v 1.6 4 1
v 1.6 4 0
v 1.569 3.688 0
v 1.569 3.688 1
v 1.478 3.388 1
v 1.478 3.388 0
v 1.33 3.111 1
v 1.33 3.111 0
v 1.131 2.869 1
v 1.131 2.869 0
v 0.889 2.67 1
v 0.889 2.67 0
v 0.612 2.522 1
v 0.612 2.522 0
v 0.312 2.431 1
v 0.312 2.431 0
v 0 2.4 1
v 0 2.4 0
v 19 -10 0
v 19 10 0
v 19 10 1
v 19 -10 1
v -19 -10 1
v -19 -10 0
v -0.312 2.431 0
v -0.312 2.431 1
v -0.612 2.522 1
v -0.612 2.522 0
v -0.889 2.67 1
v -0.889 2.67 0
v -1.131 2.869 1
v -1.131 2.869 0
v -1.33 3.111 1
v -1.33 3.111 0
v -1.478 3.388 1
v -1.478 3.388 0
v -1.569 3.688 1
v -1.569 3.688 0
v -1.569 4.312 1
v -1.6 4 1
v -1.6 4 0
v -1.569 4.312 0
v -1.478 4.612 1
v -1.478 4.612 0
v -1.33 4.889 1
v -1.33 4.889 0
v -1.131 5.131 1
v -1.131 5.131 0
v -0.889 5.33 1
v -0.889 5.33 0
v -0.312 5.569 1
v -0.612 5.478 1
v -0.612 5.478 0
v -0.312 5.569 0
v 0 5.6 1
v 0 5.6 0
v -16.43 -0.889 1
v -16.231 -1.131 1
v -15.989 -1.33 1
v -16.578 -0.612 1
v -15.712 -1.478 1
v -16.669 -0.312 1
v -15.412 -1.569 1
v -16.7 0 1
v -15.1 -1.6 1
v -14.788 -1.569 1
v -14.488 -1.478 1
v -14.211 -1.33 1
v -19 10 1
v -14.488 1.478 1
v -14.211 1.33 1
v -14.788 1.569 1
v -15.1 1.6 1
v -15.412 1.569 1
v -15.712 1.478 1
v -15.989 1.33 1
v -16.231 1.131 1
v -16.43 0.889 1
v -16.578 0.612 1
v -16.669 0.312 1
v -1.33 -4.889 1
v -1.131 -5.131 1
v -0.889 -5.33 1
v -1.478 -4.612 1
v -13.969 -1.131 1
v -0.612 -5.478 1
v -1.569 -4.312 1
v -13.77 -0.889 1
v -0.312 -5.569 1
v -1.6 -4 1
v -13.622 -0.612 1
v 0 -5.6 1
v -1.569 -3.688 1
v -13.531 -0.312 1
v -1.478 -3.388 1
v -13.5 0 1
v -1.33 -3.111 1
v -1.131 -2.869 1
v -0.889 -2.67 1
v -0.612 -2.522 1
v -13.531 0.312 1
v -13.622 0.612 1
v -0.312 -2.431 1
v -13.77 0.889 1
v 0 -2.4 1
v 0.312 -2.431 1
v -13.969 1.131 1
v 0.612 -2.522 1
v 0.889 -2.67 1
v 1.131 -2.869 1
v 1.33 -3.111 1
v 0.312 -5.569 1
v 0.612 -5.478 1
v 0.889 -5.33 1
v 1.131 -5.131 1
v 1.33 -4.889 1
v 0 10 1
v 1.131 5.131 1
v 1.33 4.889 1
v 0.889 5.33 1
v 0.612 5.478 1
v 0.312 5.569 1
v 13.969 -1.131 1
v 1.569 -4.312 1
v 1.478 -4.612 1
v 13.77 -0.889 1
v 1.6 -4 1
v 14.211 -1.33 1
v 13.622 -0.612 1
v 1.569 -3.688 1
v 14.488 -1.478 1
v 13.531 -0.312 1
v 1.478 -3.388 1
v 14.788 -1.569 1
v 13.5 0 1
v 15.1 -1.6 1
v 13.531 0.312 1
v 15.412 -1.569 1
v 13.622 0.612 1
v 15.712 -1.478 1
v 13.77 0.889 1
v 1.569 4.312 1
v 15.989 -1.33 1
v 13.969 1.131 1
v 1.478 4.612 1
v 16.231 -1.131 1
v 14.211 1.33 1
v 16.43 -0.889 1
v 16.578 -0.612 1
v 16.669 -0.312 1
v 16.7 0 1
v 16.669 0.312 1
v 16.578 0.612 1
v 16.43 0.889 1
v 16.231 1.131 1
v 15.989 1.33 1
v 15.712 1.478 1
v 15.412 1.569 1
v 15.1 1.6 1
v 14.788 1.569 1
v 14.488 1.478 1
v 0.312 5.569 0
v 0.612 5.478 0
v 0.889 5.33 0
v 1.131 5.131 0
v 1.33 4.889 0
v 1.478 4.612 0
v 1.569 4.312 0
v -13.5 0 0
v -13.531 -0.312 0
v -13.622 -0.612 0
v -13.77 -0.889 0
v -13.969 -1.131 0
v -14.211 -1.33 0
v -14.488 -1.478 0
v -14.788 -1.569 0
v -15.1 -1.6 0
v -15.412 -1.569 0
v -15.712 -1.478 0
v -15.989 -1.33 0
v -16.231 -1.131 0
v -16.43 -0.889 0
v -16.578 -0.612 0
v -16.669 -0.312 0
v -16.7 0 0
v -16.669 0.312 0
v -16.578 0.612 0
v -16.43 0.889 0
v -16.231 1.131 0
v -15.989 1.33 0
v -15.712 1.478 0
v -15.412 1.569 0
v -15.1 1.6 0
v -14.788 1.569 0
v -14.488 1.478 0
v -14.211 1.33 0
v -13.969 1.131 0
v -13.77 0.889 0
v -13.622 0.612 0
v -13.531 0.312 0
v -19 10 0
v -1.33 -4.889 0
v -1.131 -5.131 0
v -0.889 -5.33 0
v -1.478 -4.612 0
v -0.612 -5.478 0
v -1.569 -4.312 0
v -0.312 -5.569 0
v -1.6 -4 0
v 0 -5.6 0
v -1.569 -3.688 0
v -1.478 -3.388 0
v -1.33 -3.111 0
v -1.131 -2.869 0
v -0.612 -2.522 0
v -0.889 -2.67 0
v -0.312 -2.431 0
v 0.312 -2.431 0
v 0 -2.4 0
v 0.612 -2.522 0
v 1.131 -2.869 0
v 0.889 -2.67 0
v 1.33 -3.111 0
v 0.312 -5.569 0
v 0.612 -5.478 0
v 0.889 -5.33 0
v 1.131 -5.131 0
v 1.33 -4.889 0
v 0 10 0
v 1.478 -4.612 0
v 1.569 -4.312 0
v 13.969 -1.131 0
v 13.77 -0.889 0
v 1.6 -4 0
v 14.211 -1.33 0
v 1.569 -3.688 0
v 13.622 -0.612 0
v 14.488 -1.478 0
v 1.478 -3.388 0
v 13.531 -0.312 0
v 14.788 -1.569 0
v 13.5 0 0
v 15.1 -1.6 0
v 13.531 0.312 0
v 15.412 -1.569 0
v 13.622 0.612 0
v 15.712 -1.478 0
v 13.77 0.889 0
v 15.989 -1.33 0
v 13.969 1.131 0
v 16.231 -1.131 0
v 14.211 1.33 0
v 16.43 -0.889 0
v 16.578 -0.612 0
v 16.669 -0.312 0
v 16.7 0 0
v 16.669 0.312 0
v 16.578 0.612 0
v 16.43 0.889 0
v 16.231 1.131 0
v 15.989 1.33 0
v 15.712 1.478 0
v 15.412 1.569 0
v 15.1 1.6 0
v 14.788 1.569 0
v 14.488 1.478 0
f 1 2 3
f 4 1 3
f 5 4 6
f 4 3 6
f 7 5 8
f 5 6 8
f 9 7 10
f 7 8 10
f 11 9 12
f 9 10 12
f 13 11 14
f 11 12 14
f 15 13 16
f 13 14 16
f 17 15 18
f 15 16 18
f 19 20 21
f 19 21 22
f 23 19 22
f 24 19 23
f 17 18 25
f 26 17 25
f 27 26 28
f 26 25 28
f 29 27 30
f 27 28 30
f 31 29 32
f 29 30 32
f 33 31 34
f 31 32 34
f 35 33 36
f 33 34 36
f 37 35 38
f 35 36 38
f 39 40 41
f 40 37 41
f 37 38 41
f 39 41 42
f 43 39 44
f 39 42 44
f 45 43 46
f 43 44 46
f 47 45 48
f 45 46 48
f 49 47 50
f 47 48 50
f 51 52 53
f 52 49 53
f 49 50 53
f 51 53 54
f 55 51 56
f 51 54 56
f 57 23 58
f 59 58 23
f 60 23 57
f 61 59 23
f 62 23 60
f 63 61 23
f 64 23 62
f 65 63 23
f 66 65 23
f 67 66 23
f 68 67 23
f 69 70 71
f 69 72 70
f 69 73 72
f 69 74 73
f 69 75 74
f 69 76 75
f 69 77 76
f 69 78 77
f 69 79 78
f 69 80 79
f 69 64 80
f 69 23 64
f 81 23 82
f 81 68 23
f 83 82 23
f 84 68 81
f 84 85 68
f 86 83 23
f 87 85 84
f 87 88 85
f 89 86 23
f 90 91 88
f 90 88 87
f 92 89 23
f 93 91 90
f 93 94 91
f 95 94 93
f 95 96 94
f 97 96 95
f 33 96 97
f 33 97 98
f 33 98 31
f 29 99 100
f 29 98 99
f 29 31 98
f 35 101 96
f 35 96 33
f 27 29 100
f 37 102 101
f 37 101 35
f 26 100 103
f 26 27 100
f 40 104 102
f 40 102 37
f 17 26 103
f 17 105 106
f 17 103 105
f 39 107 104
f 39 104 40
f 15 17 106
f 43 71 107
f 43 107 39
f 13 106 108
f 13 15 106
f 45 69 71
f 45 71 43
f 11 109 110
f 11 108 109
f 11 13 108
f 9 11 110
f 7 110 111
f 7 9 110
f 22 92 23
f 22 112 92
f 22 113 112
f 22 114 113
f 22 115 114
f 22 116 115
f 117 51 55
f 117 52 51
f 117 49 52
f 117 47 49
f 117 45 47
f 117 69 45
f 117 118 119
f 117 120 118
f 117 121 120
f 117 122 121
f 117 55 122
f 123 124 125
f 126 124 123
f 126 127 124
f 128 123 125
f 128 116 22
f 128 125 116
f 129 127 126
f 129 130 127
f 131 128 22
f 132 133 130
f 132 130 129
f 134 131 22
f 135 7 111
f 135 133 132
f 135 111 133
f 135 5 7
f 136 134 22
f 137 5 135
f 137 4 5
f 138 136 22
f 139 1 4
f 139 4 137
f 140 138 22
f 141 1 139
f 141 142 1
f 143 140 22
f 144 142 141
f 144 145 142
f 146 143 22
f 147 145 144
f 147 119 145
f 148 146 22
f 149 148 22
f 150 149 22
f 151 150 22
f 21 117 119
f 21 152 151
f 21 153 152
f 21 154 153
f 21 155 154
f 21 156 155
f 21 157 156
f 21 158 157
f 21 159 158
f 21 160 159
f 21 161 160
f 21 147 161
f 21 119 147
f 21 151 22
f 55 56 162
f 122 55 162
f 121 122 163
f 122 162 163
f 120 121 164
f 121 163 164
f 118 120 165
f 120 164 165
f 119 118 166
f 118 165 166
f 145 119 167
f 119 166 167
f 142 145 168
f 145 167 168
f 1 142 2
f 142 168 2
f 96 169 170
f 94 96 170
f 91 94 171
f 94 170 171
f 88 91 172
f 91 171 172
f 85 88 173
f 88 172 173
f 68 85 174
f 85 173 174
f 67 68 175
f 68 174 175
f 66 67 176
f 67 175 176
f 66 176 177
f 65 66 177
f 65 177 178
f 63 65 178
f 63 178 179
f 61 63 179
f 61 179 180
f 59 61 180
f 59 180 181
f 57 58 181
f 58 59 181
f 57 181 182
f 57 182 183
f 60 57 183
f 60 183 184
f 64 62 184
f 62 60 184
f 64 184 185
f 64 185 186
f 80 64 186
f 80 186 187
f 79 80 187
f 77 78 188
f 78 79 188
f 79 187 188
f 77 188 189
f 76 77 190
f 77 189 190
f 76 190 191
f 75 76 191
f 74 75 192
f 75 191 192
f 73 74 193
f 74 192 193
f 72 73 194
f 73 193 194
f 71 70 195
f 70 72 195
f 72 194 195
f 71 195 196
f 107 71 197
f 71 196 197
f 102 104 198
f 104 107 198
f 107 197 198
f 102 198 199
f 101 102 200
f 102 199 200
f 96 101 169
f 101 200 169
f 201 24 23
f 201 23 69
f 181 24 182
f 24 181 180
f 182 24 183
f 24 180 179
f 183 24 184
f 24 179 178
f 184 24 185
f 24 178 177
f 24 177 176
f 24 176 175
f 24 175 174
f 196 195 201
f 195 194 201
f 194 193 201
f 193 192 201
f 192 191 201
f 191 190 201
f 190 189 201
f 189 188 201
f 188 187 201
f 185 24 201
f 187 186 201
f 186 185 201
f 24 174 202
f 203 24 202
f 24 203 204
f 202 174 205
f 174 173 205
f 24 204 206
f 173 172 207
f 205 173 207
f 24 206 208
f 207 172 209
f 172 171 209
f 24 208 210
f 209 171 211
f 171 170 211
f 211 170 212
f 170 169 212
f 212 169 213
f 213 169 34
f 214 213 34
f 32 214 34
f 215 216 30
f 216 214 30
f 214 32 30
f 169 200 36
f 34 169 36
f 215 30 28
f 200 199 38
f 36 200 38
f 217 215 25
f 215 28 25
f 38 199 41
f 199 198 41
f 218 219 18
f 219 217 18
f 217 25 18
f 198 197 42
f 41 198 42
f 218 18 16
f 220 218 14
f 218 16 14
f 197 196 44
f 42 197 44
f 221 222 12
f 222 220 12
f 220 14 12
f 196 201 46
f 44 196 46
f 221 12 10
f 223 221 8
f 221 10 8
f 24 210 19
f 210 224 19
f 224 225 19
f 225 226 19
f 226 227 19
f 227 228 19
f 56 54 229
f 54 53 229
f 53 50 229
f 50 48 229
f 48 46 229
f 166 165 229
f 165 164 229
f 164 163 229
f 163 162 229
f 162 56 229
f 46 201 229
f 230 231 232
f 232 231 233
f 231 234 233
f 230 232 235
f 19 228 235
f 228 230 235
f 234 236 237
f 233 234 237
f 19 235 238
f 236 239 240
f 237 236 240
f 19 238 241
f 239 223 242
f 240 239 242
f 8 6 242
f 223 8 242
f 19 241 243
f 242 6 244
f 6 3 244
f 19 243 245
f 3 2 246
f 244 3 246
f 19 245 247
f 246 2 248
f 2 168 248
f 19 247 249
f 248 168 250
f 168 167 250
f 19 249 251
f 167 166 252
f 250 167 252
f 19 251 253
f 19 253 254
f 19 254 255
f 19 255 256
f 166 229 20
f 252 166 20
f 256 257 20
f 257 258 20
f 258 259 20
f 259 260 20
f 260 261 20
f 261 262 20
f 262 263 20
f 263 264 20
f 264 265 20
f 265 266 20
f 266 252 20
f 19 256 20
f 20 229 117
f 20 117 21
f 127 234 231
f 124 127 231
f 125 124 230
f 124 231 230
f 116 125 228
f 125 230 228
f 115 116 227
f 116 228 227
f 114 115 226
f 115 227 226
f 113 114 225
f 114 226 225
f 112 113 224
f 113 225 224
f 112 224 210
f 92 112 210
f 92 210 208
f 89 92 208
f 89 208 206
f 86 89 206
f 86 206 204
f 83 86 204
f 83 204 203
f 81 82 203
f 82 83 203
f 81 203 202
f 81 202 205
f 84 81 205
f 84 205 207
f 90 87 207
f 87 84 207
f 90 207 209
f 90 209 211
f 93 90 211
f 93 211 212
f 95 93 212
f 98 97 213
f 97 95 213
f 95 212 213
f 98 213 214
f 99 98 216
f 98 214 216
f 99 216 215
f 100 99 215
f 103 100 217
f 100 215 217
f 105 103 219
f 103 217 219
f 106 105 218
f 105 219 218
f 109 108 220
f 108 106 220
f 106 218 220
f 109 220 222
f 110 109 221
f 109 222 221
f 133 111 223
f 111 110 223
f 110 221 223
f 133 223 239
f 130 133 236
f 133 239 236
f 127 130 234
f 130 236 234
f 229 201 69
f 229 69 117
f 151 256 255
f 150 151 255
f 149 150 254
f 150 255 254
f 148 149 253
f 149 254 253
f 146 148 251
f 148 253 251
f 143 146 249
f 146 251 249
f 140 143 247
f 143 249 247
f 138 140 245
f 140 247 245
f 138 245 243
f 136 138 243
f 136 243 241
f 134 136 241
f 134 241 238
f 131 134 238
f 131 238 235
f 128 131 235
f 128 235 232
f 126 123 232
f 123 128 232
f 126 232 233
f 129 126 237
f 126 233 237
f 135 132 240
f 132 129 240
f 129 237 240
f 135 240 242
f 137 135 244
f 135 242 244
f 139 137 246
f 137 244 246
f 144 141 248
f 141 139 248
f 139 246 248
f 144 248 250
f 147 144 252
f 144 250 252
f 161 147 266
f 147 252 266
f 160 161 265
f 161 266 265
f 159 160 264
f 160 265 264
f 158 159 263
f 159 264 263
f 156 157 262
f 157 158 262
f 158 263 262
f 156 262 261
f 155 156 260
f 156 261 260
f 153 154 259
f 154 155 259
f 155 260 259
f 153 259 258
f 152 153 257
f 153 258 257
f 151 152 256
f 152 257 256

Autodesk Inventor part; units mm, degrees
ref_plane "YZ Plane" through (0, 0, 0) normal (1, 0, 0) x (0, 1, 0)
ref_plane "XZ Plane" through (0, 0, 0) normal (0, 1, 0) x (-1, 0, 0)
ref_plane "XY Plane" through (0, 0, 0) normal (0, 0, 1) x (1, 0, 0)
sketch "Sketch1" plane through (0, 0, 0) normal (0, 0, 1) x (1, 0, 0)
  line L0 (-19, 10) -> (19, 10)
  line L1 (19, 10) -> (19, -10)
  line L2 (19, -10) -> (-19, -10)
  line L3 (-19, -10) -> (-19, 10)
  line L4 (-19, 10) -> (19, -10) construction
  line L5 (19, 10) -> (-19, -10) construction
  circle A0 centre (15.1, 0) radius 1.6
  line L6 (0, 0) -> (12.8976, 0)
  line L7 (0, 0) -> (0, 11.3109)
  circle A1 centre (-15.1, 0) radius 1.6
  circle A2 centre (0, -4) radius 1.6
  circle A3 centre (0, 4) radius 1.6
  dimension "d0" = 38
  dimension "d1" = 20
  dimension "d2" = 3.2
  dimension "d3" = 3.9
  dimension "d17" = 6
  dimension "d18" = 3.2
sketch "Sketch2" plane through (0, 0, 1) normal (0, 0, 1) x (1, 0, 0)
  line L0 (-17.5, 30) -> (-12.5, 30)
  line L1 (-7.5, 25) -> (-7.5, 10)
  line L2 (-12.5, 5) -> (-17.5, 5)
  line L3 (-22.5, 10) -> (-22.5, 25)
  line L4 (-22.5, 30) -> (-7.5, 5) construction
  line L5 (-7.5, 30) -> (-22.5, 5) construction
  line L6 (-28.3073, 0) -> (28.3073, 0)
  line L7 (0, 37.5) -> (0, -37.5)
  arc A0 (-17.5, 30) -> (-22.5, 25) centre (-17.5, 25) ccw
  arc A1 (-7.5, 25) -> (-12.5, 30) centre (-12.5, 25) ccw
  arc A2 (-12.5, 5) -> (-7.5, 10) centre (-12.5, 10) ccw
  arc A3 (-22.5, 10) -> (-17.5, 5) centre (-17.5, 10) ccw
  line L8 (17.5, 30) -> (12.5, 30)
  line L9 (7.5, 25) -> (7.5, 10)
  line L10 (12.5, 5) -> (17.5, 5)
  line L11 (22.5, 10) -> (22.5, 25)
  line L12 (22.5, 30) -> (7.5, 5) construction
  line L13 (7.5, 30) -> (22.5, 5) construction
  arc A4 (22.5, 25) -> (17.5, 30) centre (17.5, 25) ccw
  arc A5 (12.5, 30) -> (7.5, 25) centre (12.5, 25) ccw
  arc A6 (7.5, 10) -> (12.5, 5) centre (12.5, 10) ccw
  arc A7 (17.5, 5) -> (22.5, 10) centre (17.5, 10) ccw
  line L14 (-17.5, -30) -> (-12.5, -30)
  line L15 (-7.5, -25) -> (-7.5, -10)
  line L16 (-12.5, -5) -> (-17.5, -5)
  line L17 (-22.5, -10) -> (-22.5, -25)
  line L18 (-22.5, -30) -> (-7.5, -5) construction
  line L19 (-7.5, -30) -> (-22.5, -5) construction
  arc A8 (-22.5, -25) -> (-17.5, -30) centre (-17.5, -25) ccw
  arc A9 (-12.5, -30) -> (-7.5, -25) centre (-12.5, -25) ccw
  arc A10 (-7.5, -10) -> (-12.5, -5) centre (-12.5, -10) ccw
  arc A11 (-17.5, -5) -> (-22.5, -10) centre (-17.5, -10) ccw
  arc A12 (7.5, -25) -> (12.5, -30) centre (12.5, -25) ccw
  line L20 (7.5, -25) -> (7.5, -10)
  line L21 (17.5, -30) -> (12.5, -30)
  arc A13 (17.5, -30) -> (22.5, -25) centre (17.5, -25) ccw
  arc A14 (12.5, -5) -> (7.5, -10) centre (12.5, -10) ccw
  line L22 (22.5, -10) -> (22.5, -25)
  arc A15 (22.5, -10) -> (17.5, -5) centre (17.5, -10) ccw
  line L23 (7.5, -30) -> (22.5, -5) construction
  line L24 (22.5, -30) -> (7.5, -5) construction
  line L25 (12.5, -5) -> (17.5, -5)
  point P0 (0, 0)
  point P1 (-15, 17.5)
  point P2 (0, 0)
  point P3 (15, 17.5)
  point P4 (-15, -17.5)
  point P5 (15, -17.5)
  dimension "d9" = 15
  dimension "d10" = 25
  dimension "d12" = 10
  dimension "d13" = 15
  dimension "d14" = 5
extrude "Plate1" add sketch "Sketch1" along normal blind 1
equation "\"d5\" = 厚度"
equation "\"折彎半徑\" = 厚度"
equation "\"折彎離隙寬度\" = 厚度"
equation "\"折彎離隙深度\" = 0.5 * 厚度"
equation "\"轉角離隙大小\" = 4 * 厚度"
equation "\"最小剩餘\" = 2 * 厚度"
equation "\"轉移半徑\" = 折彎半徑"
equation "\"Jacobi半徑大小\" = 折彎半徑"
equation "\"間隙大小\" = 厚度"
equation "\"厚度\" = 1"
properties part number "battery_box_5V_side1" material "Aluminum"
